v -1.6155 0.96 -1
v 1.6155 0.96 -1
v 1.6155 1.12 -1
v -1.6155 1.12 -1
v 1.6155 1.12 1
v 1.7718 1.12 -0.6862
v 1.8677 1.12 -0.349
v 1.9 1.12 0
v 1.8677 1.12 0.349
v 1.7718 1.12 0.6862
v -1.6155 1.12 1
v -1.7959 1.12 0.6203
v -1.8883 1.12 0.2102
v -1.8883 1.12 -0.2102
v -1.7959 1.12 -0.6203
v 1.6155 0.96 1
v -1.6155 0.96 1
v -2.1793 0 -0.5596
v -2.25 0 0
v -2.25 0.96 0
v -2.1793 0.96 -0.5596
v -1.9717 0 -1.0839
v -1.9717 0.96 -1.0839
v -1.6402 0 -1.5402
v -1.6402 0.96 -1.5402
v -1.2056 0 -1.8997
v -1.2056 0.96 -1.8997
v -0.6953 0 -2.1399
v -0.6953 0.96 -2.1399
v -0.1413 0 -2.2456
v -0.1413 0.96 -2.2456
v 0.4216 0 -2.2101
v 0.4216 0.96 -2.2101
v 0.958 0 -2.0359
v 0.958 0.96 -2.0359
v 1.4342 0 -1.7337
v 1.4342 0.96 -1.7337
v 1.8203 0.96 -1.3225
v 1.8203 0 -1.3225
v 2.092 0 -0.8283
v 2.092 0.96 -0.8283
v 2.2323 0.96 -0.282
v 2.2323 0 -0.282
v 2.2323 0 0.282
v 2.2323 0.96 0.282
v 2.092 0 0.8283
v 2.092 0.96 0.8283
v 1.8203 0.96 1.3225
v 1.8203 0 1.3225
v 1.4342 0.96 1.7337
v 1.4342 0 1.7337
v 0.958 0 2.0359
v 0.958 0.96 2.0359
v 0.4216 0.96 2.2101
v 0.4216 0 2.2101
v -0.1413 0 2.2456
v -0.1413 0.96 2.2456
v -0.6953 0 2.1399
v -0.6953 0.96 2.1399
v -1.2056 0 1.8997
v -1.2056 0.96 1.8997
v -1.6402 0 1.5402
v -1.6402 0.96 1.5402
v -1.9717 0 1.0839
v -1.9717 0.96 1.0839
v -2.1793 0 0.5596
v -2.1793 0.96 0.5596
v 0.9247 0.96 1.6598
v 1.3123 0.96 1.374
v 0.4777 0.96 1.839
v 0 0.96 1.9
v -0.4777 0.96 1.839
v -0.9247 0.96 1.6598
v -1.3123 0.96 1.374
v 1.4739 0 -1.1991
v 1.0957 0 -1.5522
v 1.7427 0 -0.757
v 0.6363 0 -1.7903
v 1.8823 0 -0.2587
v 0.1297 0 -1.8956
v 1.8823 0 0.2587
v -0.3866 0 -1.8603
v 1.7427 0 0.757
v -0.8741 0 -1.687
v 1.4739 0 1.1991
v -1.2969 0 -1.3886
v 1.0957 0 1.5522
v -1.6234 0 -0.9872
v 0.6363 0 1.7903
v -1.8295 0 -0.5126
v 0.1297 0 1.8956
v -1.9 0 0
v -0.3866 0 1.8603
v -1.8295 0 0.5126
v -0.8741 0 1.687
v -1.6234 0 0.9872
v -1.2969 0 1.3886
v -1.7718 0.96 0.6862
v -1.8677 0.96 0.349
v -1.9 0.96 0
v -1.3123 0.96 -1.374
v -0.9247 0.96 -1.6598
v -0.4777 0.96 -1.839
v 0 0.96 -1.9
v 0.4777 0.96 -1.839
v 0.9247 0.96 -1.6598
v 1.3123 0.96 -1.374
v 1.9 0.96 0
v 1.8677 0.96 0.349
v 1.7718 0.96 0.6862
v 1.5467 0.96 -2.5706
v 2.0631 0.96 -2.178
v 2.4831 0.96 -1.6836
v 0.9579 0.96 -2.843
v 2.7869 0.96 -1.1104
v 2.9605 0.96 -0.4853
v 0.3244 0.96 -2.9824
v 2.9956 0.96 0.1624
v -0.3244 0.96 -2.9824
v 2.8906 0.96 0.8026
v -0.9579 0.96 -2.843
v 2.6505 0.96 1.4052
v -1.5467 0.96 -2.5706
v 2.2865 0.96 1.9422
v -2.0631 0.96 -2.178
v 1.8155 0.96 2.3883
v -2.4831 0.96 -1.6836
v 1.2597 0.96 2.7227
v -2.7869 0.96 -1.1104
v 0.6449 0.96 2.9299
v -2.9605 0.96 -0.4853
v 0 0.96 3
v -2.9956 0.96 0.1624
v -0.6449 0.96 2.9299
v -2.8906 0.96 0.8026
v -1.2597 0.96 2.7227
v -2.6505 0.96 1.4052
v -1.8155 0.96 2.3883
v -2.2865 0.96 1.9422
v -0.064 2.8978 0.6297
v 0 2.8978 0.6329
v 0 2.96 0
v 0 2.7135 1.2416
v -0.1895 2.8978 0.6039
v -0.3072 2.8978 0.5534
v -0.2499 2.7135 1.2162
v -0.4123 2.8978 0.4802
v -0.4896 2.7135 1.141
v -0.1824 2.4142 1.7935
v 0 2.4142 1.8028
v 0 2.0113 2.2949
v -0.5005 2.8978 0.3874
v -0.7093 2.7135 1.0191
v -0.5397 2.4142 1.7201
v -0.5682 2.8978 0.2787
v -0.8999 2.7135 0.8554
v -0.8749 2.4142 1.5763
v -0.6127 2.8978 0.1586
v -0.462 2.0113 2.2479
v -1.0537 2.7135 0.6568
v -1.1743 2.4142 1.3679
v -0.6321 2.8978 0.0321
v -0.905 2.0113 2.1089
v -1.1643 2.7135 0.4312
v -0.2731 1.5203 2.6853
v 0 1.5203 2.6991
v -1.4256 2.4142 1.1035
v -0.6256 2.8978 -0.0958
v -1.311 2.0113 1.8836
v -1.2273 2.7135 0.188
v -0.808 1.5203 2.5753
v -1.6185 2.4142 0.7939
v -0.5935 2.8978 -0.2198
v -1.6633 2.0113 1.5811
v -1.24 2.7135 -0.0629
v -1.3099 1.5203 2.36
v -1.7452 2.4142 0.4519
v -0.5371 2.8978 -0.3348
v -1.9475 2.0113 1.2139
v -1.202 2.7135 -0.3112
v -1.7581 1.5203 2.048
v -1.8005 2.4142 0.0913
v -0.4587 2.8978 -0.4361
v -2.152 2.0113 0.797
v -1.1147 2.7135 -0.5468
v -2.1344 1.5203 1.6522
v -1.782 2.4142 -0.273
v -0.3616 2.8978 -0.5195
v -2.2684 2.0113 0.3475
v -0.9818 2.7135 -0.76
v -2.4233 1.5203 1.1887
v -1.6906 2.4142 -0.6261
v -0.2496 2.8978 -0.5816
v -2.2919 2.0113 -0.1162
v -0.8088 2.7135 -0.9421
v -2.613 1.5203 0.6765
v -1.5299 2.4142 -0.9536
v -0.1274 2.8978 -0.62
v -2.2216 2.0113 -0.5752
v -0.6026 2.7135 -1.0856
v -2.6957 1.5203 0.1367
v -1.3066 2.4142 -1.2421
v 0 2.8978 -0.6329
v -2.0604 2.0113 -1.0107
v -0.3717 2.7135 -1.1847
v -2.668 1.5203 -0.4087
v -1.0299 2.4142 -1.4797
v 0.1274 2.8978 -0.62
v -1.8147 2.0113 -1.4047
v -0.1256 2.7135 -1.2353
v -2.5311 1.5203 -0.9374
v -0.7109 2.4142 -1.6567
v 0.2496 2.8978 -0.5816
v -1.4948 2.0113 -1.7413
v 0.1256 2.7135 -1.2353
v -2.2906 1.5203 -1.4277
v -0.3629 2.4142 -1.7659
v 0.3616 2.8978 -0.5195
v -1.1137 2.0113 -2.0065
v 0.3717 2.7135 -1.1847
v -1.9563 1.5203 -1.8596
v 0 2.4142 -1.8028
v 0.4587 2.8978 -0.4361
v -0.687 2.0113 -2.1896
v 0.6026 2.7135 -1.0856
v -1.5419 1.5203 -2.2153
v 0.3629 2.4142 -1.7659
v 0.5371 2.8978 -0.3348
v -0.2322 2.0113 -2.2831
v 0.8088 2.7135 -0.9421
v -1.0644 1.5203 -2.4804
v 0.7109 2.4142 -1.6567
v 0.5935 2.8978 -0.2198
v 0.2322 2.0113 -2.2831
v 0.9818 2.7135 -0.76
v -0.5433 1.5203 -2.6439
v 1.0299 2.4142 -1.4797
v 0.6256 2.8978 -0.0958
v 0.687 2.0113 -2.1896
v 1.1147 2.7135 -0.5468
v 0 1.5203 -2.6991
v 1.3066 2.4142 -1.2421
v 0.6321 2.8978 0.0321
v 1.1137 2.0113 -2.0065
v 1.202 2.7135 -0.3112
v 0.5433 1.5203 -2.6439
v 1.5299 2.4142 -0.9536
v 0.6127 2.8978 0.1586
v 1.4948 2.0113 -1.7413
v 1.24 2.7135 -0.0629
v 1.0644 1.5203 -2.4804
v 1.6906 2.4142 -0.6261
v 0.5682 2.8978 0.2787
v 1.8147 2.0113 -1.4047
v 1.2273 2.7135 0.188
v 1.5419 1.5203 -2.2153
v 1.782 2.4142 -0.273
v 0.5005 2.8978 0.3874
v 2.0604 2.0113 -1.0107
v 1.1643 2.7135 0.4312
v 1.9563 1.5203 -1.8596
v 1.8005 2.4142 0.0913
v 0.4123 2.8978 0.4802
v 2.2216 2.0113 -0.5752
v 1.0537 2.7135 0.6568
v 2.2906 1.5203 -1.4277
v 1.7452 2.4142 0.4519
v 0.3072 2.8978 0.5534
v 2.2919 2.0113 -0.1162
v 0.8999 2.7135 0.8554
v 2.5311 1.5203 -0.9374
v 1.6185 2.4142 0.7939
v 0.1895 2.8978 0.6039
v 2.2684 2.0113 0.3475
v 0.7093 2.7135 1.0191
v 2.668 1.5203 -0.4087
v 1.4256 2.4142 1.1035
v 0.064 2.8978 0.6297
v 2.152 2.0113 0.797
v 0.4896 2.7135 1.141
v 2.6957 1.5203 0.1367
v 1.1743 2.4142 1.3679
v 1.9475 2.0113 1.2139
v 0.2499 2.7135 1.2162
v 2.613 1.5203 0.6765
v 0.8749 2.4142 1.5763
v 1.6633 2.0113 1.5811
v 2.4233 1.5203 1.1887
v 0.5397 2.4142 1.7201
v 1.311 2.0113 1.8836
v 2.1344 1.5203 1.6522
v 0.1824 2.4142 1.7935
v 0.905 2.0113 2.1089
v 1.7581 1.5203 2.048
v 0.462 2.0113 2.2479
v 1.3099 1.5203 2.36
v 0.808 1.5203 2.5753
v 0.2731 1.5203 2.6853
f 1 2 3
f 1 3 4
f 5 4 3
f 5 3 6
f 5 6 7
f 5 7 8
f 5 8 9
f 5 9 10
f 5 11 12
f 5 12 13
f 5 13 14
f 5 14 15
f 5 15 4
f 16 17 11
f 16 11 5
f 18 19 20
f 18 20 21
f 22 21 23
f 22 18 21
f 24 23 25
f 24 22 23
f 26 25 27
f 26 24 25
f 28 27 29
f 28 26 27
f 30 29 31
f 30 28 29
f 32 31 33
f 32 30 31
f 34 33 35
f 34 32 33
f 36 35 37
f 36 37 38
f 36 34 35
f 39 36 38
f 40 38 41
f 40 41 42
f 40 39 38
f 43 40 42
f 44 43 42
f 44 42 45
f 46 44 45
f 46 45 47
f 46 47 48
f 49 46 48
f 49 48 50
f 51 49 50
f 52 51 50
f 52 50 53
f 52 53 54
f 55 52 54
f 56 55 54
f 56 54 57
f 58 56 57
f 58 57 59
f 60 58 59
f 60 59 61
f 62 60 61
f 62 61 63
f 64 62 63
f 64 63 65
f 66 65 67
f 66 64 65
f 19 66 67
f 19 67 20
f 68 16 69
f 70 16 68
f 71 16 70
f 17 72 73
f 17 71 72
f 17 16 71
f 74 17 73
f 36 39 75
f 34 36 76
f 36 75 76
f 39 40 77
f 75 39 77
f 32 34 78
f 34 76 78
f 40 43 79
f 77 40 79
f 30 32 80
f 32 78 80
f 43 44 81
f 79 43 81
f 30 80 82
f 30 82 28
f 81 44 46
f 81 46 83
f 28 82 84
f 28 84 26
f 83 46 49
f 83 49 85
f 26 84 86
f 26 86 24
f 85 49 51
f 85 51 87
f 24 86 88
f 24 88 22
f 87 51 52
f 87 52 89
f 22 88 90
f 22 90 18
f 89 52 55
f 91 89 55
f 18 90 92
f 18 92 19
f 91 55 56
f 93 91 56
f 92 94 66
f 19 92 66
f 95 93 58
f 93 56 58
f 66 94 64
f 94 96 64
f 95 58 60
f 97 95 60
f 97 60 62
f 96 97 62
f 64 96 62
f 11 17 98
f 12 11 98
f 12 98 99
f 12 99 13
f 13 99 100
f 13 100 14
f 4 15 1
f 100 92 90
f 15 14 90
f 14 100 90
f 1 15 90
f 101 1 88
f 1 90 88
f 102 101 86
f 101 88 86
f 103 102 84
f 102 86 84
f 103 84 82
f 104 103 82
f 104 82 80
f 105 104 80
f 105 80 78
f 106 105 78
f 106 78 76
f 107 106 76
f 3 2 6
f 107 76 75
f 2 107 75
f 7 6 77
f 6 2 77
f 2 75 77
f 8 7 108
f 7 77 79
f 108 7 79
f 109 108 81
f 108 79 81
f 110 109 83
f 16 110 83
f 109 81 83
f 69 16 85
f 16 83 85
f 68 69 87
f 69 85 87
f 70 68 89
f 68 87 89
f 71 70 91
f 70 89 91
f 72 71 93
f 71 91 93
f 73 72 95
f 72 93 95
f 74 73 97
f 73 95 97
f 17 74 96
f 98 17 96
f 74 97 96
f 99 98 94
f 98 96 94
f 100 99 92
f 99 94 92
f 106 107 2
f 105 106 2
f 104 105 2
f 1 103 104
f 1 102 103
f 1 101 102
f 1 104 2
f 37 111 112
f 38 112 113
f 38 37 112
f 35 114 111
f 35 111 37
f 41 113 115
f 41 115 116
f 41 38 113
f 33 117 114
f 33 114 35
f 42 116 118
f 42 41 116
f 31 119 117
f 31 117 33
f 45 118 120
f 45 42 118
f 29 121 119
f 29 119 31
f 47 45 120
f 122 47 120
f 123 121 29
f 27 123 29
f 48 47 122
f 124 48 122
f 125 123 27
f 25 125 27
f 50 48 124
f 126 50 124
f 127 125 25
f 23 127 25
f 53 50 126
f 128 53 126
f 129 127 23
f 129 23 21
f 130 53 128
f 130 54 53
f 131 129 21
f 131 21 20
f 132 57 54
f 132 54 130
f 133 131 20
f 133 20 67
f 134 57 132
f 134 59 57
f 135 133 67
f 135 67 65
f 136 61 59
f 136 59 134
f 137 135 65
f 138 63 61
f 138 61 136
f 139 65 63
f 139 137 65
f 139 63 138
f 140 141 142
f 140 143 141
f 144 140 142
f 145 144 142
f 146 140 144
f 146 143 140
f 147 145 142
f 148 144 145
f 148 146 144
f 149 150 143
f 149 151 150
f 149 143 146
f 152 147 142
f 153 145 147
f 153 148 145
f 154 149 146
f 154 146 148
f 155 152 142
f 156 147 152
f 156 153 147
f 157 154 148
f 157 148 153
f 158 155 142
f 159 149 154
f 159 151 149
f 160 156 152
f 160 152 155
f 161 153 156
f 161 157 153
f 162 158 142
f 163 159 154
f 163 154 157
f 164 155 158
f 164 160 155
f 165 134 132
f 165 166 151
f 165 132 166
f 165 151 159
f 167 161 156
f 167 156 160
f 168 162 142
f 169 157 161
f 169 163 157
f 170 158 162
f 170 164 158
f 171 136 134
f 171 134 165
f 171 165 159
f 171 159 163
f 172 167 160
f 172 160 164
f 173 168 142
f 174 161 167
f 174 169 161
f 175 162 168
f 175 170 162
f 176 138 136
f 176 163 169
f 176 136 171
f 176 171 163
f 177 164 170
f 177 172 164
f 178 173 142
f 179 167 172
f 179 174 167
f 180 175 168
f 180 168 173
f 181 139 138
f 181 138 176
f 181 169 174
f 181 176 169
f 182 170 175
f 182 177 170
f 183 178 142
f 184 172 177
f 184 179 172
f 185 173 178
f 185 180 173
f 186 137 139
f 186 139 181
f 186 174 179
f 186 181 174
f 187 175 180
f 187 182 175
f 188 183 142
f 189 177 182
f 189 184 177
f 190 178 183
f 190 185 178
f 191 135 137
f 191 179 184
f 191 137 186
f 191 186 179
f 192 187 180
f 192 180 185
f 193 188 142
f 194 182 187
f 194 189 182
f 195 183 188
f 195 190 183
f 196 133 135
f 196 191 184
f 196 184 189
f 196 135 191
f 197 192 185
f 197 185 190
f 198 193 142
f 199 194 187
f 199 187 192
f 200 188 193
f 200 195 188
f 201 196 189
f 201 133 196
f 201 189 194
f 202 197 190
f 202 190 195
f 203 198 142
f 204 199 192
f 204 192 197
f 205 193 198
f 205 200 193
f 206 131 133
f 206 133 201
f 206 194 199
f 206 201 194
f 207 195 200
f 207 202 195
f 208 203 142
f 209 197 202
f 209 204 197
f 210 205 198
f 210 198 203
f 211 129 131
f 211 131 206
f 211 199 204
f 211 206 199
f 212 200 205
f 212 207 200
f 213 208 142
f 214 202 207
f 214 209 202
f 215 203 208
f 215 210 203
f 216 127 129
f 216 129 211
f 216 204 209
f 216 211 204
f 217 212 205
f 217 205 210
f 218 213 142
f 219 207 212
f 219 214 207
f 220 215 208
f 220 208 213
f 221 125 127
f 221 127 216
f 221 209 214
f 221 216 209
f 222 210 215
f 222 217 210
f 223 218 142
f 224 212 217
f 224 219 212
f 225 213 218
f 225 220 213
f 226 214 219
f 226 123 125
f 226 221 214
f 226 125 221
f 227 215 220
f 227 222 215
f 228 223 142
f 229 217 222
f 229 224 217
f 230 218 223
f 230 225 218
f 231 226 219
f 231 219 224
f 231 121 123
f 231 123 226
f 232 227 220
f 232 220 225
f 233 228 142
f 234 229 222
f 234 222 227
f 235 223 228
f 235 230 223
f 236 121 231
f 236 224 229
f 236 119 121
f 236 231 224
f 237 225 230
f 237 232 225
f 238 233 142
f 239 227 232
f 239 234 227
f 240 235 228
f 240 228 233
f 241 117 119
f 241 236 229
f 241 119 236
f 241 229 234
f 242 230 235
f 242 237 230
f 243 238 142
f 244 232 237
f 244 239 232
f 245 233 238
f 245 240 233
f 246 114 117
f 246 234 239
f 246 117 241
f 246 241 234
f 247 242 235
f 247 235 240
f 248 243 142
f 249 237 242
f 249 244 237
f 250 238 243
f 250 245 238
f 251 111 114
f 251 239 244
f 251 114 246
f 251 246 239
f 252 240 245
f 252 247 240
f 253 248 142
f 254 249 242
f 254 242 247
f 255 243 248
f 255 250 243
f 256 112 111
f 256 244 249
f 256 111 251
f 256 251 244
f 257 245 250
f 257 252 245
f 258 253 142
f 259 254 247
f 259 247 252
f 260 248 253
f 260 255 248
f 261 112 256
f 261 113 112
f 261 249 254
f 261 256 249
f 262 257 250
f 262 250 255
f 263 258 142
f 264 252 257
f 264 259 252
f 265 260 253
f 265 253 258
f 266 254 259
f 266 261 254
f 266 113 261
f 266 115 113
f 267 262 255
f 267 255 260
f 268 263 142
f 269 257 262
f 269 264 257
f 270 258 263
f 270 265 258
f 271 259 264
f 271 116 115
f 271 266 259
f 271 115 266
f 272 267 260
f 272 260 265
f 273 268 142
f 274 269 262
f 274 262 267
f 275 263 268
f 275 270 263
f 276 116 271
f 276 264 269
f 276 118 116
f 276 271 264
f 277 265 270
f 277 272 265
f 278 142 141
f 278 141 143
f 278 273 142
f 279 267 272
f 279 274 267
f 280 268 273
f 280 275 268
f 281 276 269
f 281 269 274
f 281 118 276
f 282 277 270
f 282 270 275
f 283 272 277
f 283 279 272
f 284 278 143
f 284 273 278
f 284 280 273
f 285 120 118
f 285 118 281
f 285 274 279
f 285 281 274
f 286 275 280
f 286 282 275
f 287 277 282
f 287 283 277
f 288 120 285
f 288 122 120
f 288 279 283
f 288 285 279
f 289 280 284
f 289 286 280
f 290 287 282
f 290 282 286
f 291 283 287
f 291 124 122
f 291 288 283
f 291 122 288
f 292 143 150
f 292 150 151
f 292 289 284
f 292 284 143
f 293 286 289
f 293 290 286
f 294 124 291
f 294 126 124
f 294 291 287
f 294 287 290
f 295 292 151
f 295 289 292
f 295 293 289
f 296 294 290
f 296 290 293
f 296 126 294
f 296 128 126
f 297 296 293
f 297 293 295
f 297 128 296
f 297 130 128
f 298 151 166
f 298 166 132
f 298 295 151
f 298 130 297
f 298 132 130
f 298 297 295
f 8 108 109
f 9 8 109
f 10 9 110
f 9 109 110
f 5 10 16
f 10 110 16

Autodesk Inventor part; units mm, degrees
ref_plane "YZ Plane" through (0, 0, 0) normal (1, 0, 0) x (0, 1, 0)
ref_plane "XZ Plane" through (0, 0, 0) normal (0, 1, 0) x (-1, 0, 0)
ref_plane "XY Plane" through (0, 0, 0) normal (0, 0, 1) x (1, 0, 0)
sketch "Sketch1" plane through (0, 0, 0) normal (0, 1, 0) x (-1, 0, 0)
  circle A0 centre (0, 0) radius 2.25
  circle A1 centre (0, 0) radius 1.9
  dimension "d0" = 4.5
  dimension "d1" = 3.8
extrude "Extrusion1" add sketch "Sketch1" along normal blind 0.96
sketch "Sketch2" plane through (0, 0, 0) normal (1, 0, 0) x (0, 1, 0)
  arc A0 (0.96, -3) -> (0.96, 3) centre (-0.29, 0) ccw
  line L0 (0.96, -2.25) -> (0.96, 2.25) projected
  line L1 (0.96, 3) -> (0.96, 2.25)
  line L2 (0.96, -3) -> (0.96, -2.25)
  line L3 (2.96, 0) -> (0.96, 0)
  point P0 (0, 0)
  dimension "d4" = 2
  dimension "d5" = 3
revolve "Revolution1" add sketch "Sketch2" angle 360 about axis through (0, 2.96, 0) along (0, -1, 0) contours L3 L0 L1 A0
sketch "Sketch3" plane through (0, 0.96, 0) normal (0, -1, 0) x (1, 0, 0)
  line L0 (-2.25, 1) -> (2.25, 1)
  line L1 (2.25, 1) -> (2.25, -1)
  line L2 (2.25, -1) -> (-2.25, -1)
  line L3 (-2.25, -1) -> (-2.25, 1)
  line L4 (-2.25, 1) -> (2.25, -1) construction
  line L5 (2.25, 1) -> (-2.25, -1) construction
  circle A0 centre (0, 0) radius 2.25 projected
  circle A1 centre (0, 0) radius 1.9 projected
  point P0 (1.6155, 1)
  point P1 (-1.6155, 1)
  point P2 (-1.6155, -1)
  point P3 (1.6155, -1)
  dimension "d7" = 2
extrude "Extrusion2" cut sketch "Sketch3" against normal blind 0.16 contours L0 A1 L2
properties part number "Hephaestus38v2 Case Feet" material "Thermoplastic Resin"
